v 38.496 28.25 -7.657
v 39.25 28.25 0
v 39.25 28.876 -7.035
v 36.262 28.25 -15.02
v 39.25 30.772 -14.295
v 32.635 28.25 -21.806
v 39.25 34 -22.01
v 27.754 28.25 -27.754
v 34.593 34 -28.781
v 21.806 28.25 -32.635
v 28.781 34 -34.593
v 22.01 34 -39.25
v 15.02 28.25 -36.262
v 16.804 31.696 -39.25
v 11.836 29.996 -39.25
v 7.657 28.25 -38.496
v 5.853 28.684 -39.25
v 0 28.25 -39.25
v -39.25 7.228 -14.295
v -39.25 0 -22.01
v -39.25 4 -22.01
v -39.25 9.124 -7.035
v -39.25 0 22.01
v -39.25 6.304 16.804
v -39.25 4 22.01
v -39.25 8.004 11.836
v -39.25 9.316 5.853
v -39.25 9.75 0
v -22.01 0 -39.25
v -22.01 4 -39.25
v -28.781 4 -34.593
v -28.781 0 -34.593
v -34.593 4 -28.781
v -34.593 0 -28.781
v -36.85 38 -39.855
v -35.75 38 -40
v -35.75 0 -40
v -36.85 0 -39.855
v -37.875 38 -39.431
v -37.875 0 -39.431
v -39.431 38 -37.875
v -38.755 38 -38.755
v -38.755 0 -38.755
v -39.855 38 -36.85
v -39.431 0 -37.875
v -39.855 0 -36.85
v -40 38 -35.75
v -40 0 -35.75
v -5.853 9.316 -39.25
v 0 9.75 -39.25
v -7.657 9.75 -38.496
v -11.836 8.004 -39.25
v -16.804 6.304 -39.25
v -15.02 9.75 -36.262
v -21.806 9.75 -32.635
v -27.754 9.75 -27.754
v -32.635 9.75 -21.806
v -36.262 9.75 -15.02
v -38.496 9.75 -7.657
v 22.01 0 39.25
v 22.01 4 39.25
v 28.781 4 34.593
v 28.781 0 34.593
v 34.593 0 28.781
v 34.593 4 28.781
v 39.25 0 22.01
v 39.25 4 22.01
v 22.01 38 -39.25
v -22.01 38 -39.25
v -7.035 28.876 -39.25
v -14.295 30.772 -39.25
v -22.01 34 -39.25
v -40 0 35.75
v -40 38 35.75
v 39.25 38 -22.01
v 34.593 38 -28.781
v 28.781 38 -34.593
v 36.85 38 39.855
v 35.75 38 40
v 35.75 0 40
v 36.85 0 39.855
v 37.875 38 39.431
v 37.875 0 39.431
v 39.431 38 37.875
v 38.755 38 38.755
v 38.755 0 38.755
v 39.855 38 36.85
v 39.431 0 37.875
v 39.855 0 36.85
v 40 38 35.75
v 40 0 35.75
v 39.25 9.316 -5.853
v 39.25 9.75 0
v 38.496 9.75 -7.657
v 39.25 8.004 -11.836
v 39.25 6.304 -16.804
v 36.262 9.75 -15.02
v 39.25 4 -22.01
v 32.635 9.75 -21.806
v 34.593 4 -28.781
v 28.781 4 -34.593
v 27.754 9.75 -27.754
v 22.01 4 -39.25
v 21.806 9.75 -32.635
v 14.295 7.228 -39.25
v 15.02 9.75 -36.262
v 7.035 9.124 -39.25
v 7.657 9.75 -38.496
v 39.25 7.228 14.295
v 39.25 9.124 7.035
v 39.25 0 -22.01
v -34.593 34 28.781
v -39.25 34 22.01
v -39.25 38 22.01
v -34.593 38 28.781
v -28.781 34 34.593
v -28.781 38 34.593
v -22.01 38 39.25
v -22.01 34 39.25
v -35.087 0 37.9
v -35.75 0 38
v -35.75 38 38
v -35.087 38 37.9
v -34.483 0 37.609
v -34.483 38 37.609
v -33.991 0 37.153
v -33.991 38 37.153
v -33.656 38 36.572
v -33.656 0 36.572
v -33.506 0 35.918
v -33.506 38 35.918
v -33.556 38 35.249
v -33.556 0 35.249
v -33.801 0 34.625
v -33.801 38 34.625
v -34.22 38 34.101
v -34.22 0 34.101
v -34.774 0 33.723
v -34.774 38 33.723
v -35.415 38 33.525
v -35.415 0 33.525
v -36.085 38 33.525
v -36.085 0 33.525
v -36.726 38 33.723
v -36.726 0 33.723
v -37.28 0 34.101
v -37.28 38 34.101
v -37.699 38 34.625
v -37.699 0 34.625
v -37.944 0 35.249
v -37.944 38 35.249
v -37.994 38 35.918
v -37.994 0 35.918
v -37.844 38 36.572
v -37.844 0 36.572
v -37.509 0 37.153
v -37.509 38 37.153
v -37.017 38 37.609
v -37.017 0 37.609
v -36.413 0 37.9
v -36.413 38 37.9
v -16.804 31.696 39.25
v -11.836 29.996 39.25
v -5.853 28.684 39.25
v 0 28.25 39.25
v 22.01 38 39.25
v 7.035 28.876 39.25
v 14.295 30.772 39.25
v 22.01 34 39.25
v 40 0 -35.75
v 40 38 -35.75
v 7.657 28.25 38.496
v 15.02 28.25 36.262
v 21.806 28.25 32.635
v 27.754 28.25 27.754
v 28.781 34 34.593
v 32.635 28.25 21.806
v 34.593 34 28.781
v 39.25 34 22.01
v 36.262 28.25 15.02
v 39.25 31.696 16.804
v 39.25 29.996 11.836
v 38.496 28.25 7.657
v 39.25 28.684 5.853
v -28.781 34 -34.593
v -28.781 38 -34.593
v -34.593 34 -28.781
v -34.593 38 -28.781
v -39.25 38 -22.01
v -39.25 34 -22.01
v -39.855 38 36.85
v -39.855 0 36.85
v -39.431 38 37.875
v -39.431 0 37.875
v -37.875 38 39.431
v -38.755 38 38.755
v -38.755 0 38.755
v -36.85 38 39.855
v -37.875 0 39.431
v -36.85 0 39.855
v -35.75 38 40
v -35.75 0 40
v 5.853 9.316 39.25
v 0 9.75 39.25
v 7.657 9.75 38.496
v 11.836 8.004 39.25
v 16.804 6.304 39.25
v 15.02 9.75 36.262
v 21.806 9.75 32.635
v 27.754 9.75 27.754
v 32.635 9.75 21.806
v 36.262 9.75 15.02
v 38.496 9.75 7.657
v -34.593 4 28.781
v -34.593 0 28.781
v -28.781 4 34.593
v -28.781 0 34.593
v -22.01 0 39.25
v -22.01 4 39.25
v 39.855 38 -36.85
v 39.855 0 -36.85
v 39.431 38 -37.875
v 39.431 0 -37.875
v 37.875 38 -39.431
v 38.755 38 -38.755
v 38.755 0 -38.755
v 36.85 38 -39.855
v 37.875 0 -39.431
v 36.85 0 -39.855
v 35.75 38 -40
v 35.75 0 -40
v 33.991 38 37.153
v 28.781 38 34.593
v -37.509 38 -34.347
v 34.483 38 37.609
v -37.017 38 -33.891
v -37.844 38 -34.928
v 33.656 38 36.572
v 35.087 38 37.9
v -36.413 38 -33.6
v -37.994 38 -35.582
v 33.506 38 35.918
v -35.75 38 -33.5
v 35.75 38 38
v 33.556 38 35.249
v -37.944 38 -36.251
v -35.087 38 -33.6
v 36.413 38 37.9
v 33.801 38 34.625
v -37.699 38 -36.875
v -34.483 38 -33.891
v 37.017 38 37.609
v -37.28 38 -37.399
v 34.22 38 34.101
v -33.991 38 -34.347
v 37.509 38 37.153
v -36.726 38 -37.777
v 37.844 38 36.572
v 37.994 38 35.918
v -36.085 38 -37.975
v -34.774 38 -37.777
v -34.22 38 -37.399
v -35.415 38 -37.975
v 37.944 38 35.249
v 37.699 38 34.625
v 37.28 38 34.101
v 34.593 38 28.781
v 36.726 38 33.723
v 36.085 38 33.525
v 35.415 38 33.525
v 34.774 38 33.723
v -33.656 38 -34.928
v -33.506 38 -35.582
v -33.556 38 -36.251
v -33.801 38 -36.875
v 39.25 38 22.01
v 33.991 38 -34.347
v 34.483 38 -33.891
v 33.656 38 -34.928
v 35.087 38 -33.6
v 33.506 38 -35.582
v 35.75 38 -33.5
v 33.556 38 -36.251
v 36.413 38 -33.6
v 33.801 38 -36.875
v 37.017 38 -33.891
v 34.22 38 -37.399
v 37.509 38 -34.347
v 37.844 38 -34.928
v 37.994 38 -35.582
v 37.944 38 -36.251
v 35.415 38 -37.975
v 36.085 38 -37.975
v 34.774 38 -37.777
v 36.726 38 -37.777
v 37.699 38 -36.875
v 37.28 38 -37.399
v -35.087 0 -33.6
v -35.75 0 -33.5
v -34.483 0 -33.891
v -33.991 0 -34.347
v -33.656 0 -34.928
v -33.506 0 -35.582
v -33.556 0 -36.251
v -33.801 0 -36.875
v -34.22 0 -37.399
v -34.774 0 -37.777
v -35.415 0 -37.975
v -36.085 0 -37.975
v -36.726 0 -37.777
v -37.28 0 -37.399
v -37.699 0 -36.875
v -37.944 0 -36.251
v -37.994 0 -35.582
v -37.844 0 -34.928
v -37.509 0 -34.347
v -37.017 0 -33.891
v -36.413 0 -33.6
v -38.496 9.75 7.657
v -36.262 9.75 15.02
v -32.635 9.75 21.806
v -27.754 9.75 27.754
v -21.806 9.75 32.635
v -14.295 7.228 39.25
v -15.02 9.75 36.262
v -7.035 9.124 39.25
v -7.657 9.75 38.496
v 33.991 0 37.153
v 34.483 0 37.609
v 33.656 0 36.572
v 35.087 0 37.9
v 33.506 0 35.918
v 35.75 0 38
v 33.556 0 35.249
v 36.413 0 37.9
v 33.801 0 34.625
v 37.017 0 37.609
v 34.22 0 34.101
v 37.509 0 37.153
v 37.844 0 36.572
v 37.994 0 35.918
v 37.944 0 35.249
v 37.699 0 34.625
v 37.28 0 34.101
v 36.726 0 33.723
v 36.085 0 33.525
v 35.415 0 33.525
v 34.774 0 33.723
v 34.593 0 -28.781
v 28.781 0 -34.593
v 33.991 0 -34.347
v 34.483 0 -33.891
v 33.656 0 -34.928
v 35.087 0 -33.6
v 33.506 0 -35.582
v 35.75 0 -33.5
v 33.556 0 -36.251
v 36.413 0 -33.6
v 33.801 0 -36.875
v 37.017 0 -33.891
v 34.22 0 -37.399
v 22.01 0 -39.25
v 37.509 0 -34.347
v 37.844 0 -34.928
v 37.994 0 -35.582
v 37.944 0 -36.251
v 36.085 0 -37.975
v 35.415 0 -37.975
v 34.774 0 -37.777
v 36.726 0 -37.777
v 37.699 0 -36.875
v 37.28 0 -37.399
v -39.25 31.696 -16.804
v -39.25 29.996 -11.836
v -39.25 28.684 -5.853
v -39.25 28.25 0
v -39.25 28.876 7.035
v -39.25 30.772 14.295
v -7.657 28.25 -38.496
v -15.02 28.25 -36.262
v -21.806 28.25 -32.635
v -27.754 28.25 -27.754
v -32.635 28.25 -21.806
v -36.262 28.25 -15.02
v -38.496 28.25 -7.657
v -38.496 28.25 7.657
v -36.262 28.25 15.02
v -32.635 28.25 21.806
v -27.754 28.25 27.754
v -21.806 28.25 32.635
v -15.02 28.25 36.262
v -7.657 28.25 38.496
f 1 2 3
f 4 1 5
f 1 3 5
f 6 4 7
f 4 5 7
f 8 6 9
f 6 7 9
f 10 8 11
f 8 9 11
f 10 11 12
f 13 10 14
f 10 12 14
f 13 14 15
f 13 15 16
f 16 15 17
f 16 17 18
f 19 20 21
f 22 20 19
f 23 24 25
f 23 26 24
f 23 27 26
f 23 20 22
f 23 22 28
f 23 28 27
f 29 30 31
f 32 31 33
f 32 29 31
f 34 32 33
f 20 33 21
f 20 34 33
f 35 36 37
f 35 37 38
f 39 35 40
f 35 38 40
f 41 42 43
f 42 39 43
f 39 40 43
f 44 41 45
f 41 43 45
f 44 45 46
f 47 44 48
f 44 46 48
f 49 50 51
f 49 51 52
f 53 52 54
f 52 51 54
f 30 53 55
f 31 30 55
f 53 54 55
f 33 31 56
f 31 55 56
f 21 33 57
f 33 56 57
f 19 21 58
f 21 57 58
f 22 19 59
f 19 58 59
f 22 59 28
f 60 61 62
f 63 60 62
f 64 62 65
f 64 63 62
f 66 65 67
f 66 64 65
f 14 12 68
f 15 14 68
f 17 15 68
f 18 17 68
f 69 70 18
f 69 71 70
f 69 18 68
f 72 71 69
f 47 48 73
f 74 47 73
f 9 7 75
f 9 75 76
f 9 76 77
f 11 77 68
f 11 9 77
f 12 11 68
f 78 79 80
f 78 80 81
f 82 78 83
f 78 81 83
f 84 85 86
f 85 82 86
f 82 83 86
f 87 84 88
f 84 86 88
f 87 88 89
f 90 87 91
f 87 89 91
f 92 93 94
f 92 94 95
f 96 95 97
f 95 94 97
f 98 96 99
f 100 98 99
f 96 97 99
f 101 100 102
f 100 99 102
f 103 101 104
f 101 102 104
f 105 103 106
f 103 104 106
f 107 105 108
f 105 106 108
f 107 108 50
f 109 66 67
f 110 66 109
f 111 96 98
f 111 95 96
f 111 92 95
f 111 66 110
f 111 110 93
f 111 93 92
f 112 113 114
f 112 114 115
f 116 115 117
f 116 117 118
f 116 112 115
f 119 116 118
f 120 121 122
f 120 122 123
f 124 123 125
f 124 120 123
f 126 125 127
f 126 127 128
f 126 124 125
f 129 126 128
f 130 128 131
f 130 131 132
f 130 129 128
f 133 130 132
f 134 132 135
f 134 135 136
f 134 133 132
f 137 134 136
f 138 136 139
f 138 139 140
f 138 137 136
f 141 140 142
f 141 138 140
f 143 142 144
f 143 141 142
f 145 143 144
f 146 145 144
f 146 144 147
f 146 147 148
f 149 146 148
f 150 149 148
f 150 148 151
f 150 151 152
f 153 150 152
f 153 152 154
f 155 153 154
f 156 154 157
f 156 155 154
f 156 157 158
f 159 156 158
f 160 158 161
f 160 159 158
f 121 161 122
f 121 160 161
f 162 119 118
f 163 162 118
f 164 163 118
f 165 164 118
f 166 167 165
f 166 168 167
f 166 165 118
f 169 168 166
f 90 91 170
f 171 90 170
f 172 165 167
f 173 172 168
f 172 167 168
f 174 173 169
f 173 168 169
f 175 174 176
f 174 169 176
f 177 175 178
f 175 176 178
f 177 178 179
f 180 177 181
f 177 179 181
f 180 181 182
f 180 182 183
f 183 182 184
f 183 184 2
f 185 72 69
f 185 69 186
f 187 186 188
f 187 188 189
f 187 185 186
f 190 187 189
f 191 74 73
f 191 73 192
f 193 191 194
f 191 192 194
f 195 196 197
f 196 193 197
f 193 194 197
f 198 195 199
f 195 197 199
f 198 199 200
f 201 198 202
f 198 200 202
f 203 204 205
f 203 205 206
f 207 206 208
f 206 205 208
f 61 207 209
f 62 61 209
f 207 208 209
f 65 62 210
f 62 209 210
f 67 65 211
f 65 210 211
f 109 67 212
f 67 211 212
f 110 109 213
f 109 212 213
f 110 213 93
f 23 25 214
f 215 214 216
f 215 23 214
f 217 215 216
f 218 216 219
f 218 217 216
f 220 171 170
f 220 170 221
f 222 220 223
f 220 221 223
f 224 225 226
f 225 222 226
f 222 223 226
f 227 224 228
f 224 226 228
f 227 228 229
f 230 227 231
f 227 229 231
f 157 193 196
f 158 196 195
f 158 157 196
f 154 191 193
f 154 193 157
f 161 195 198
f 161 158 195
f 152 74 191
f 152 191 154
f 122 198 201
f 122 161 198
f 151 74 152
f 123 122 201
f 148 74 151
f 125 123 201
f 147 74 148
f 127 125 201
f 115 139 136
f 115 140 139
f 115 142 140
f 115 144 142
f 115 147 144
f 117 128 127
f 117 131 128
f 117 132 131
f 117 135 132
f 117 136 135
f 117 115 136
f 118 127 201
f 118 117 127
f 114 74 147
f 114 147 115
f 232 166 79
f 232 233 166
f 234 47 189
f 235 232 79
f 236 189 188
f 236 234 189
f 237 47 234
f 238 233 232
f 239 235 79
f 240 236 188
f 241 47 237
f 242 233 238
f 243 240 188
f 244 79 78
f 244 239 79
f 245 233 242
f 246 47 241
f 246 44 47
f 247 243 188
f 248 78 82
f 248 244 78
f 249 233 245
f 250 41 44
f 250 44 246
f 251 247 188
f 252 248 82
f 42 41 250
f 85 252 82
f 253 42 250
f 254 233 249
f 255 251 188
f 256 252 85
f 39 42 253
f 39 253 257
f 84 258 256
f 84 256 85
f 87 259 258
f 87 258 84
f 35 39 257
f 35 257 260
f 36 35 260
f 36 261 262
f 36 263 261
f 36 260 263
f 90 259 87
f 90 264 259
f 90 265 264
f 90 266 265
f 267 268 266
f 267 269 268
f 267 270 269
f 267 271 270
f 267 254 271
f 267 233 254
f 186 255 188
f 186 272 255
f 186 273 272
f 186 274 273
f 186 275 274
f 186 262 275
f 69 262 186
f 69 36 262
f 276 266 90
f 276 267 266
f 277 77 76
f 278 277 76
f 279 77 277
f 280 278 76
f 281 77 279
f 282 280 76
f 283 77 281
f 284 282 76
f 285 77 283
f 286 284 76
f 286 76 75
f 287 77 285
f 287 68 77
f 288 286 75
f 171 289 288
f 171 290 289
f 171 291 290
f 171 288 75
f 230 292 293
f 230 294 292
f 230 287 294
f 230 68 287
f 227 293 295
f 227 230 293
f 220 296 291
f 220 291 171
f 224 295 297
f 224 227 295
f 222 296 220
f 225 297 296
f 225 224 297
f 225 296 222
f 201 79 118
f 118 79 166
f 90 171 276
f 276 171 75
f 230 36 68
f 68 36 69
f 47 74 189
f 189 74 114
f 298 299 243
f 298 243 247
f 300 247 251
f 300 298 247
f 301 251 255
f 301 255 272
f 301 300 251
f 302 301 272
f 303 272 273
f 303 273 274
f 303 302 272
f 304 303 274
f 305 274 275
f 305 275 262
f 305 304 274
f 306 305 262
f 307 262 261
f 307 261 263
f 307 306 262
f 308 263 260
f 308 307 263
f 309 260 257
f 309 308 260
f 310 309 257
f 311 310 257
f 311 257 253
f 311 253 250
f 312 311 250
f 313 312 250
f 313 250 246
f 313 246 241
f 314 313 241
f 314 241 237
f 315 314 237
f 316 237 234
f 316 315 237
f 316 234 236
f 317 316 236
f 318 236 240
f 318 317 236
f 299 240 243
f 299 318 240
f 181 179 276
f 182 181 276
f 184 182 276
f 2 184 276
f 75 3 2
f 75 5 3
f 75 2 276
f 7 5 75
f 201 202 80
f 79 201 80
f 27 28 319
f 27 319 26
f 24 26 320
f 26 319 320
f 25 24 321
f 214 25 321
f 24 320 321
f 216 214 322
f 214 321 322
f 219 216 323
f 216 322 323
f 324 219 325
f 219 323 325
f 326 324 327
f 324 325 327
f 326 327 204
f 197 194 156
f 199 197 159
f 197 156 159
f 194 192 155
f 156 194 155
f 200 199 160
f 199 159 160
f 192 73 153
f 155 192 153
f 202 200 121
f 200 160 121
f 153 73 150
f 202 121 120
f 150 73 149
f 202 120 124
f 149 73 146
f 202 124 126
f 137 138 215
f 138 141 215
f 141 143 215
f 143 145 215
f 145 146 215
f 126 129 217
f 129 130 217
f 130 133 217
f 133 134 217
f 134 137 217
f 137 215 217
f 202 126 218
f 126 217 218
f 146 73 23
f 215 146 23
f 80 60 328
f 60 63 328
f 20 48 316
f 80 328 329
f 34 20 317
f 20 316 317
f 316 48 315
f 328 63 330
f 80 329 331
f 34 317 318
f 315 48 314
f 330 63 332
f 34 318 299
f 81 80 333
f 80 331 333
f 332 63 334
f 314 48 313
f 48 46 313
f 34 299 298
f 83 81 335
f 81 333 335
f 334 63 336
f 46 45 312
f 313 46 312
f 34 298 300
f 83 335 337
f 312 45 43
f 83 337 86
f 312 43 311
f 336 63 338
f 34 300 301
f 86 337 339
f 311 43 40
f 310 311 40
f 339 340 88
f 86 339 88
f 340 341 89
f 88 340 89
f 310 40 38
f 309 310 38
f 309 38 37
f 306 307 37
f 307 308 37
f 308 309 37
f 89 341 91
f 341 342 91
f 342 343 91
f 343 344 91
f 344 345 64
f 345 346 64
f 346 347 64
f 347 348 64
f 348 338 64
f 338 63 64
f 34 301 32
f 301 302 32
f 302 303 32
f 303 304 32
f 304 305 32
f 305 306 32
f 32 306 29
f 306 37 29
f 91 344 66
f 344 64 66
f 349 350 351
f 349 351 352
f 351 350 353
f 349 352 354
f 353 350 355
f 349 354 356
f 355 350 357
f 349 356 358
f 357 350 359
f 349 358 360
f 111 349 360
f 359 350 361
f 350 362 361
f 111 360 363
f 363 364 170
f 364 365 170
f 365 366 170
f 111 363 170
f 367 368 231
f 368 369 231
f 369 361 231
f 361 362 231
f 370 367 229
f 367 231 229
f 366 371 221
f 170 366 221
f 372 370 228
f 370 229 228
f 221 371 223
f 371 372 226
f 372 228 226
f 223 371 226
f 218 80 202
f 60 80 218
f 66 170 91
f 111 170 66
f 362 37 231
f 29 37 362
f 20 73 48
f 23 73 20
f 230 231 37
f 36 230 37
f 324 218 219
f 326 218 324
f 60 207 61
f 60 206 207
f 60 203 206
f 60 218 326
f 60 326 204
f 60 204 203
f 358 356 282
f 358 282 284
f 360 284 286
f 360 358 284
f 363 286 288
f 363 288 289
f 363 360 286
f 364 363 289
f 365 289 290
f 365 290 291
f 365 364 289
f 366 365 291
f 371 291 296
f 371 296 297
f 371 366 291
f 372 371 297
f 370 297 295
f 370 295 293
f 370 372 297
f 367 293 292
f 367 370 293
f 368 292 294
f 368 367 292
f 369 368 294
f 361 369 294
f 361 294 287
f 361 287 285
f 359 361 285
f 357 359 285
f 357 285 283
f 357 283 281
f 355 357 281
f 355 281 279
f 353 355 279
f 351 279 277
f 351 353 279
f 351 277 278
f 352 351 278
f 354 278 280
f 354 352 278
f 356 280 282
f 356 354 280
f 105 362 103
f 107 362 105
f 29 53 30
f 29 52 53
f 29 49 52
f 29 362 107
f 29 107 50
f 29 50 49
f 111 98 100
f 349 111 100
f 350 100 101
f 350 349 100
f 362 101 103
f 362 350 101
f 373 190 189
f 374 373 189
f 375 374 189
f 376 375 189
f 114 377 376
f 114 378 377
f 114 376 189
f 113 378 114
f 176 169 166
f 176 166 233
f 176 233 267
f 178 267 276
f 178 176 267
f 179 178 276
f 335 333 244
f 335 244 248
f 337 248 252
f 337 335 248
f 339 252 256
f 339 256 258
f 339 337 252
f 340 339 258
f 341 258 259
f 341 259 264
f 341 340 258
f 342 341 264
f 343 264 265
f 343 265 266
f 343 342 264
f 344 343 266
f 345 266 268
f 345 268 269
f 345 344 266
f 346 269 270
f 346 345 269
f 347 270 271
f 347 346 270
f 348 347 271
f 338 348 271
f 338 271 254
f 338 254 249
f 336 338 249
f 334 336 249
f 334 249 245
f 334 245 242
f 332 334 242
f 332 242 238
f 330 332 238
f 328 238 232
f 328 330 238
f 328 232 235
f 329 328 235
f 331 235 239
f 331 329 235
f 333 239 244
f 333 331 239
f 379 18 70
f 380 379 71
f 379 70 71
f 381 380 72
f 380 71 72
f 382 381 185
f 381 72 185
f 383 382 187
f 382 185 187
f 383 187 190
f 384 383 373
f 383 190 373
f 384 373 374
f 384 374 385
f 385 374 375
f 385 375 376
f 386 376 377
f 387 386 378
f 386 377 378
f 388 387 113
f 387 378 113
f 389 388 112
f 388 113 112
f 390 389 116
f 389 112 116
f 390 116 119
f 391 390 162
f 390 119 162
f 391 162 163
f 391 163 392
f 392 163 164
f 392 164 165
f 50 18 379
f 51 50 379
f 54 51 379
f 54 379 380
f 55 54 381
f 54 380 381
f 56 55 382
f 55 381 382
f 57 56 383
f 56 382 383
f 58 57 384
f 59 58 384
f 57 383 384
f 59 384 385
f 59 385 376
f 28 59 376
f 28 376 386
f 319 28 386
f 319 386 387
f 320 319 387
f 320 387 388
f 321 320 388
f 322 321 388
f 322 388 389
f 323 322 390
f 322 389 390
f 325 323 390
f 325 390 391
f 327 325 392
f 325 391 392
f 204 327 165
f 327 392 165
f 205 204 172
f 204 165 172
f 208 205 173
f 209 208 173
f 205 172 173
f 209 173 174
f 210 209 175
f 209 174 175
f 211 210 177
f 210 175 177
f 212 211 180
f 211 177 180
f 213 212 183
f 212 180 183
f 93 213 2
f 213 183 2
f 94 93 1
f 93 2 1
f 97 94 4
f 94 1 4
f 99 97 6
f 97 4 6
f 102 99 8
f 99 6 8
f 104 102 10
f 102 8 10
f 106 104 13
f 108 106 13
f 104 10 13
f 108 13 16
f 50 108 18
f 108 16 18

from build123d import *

# Parameters (mm, degrees)
SKETCH1_R               = 2.25
BOSS_EXTRUDE1_DEPTH     = 38
CUT_EXTRUDE1_DEPTH      = 75.121521841
CUT_EXTRUDE1_DEPTH_BACK = 75.121521841


with BuildPart() as part:
    # Sketch1 → Boss-Extrude1 (new body)
    with BuildSketch(Plane(origin=(0, 0, 0), x_dir=(1, 0, 0), z_dir=(0, 1, 0))):
        with BuildLine():
            Line((-35.75, -40), (35.75, -40))
            ThreePointArc((35.75, -40), (38.75520382, -38.75520382), (40, -35.75))
            Line((40, -35.75), (40, 35.75))
            ThreePointArc((40, 35.75), (38.75520382, 38.75520382), (35.75, 40))
            Line((35.75, 40), (-35.75, 40))
            ThreePointArc((-35.75, 40), (-38.75520382, 38.75520382), (-40, 35.75))
            Line((-40, 35.75), (-40, -35.75))
            ThreePointArc((-40, -35.75), (-38.75520382, -38.75520382), (-35.75, -40))
        make_face()
        with Locations(Location((35.75, 35.75, 0), (0, 0, 270))):
            Circle(SKETCH1_R, mode=Mode.SUBTRACT)
        with Locations(Location((35.75, -35.75, 0), (0, 0, 270))):
            Circle(SKETCH1_R, mode=Mode.SUBTRACT)
        with Locations(Location((-35.75, -35.75, 0), (0, 0, 270))):
            Circle(SKETCH1_R, mode=Mode.SUBTRACT)
        with Locations(Location((-35.75, 35.75, 0), (0, 0, 270))):
            Circle(SKETCH1_R, mode=Mode.SUBTRACT)
        with BuildLine():
            Line((22.009940936, 39.25), (-22.009940936, 39.25))
            ThreePointArc((-22.009940936, 39.25), (-31.819805153, 31.819805153), (-39.25, 22.009940936))
            Line((-39.25, 22.009940936), (-39.25, -22.009940936))
            ThreePointArc((-39.25, -22.009940936), (-31.819805153, -31.819805153), (-22.009940936, -39.25))
            Line((-22.009940936, -39.25), (22.009940936, -39.25))
            ThreePointArc((22.009940936, -39.25), (31.819805153, -31.819805153), (39.25, -22.009940936))
            Line((39.25, -22.009940936), (39.25, 22.009940936))
            ThreePointArc((39.25, 22.009940936), (31.819805153, 31.819805153), (22.009940936, 39.25))
        make_face(mode=Mode.SUBTRACT)
    extrude(amount=BOSS_EXTRUDE1_DEPTH)

    # Sketch2 → Revolve1 (revolve)
    with BuildSketch(Plane(origin=(0, 0, 0), x_dir=(0, 0, -1), z_dir=(1, 0, 0))):
        Polygon((45, 4), (39.25, 9.75), (39.25, 28.25), (45, 34), align=None)
    revolve(axis=Axis((0, 0, 0), (0, 1, 0)))

    # Sketch3 → Cut-Extrude1 (cut, two sides: drawn at the far end of the back side and taken through both)
    with BuildSketch(Plane(origin=(0, 0, 0), x_dir=(1, 0, 0), z_dir=(0, 1, 0)).offset(-CUT_EXTRUDE1_DEPTH_BACK)):
        with BuildLine():
            Line((-40, -35.75), (-40, 35.75))
            ThreePointArc((-40, 35.75), (-39.676488013, 37.376404588), (-38.75520382, 38.75520382))
            ThreePointArc((-38.75520382, 38.75520382), (-54.808134855, 0), (-38.75520382, -38.75520382))
            ThreePointArc((-38.75520382, -38.75520382), (-39.676488013, -37.376404588), (-40, -35.75))
        make_face()
        with BuildLine():
            ThreePointArc((-35.75, -40), (-37.376404588, -39.676488013), (-38.75520382, -38.75520382))
            ThreePointArc((-38.75520382, -38.75520382), (6e-09, -54.808134855), (38.755203828, -38.755203812))
            ThreePointArc((38.755203828, -38.755203812), (37.376404593, -39.676488011), (35.75, -40))
            Line((35.75, -40), (-35.75, -40))
        make_face()
        with BuildLine():
            ThreePointArc((54.808134855, 0), (50.636113998, 20.97416519), (38.755203786, 38.755203854))
            ThreePointArc((38.755203786, 38.755203854), (39.676488004, 37.376404609), (40, 35.75))
            Line((40, 35.75), (40, -35.75))
            ThreePointArc((40, -35.75), (39.676488015, -37.376404582), (38.755203828, -38.755203812))
            ThreePointArc((38.755203828, -38.755203812), (50.63611401, -20.974165163), (54.808134855, 0))
        make_face()
        with BuildLine():
            ThreePointArc((38.755203786, 38.755203854), (-2.4e-08, 54.808134855), (-38.75520382, 38.75520382))
            ThreePointArc((-38.75520382, 38.75520382), (-37.376404588, 39.676488013), (-35.75, 40))
            Line((-35.75, 40), (35.75, 40))
            ThreePointArc((35.75, 40), (37.376404566, 39.676488022), (38.755203786, 38.755203854))
        make_face()
    extrude(amount=CUT_EXTRUDE1_DEPTH + CUT_EXTRUDE1_DEPTH_BACK, mode=Mode.SUBTRACT)


solid = part.part
